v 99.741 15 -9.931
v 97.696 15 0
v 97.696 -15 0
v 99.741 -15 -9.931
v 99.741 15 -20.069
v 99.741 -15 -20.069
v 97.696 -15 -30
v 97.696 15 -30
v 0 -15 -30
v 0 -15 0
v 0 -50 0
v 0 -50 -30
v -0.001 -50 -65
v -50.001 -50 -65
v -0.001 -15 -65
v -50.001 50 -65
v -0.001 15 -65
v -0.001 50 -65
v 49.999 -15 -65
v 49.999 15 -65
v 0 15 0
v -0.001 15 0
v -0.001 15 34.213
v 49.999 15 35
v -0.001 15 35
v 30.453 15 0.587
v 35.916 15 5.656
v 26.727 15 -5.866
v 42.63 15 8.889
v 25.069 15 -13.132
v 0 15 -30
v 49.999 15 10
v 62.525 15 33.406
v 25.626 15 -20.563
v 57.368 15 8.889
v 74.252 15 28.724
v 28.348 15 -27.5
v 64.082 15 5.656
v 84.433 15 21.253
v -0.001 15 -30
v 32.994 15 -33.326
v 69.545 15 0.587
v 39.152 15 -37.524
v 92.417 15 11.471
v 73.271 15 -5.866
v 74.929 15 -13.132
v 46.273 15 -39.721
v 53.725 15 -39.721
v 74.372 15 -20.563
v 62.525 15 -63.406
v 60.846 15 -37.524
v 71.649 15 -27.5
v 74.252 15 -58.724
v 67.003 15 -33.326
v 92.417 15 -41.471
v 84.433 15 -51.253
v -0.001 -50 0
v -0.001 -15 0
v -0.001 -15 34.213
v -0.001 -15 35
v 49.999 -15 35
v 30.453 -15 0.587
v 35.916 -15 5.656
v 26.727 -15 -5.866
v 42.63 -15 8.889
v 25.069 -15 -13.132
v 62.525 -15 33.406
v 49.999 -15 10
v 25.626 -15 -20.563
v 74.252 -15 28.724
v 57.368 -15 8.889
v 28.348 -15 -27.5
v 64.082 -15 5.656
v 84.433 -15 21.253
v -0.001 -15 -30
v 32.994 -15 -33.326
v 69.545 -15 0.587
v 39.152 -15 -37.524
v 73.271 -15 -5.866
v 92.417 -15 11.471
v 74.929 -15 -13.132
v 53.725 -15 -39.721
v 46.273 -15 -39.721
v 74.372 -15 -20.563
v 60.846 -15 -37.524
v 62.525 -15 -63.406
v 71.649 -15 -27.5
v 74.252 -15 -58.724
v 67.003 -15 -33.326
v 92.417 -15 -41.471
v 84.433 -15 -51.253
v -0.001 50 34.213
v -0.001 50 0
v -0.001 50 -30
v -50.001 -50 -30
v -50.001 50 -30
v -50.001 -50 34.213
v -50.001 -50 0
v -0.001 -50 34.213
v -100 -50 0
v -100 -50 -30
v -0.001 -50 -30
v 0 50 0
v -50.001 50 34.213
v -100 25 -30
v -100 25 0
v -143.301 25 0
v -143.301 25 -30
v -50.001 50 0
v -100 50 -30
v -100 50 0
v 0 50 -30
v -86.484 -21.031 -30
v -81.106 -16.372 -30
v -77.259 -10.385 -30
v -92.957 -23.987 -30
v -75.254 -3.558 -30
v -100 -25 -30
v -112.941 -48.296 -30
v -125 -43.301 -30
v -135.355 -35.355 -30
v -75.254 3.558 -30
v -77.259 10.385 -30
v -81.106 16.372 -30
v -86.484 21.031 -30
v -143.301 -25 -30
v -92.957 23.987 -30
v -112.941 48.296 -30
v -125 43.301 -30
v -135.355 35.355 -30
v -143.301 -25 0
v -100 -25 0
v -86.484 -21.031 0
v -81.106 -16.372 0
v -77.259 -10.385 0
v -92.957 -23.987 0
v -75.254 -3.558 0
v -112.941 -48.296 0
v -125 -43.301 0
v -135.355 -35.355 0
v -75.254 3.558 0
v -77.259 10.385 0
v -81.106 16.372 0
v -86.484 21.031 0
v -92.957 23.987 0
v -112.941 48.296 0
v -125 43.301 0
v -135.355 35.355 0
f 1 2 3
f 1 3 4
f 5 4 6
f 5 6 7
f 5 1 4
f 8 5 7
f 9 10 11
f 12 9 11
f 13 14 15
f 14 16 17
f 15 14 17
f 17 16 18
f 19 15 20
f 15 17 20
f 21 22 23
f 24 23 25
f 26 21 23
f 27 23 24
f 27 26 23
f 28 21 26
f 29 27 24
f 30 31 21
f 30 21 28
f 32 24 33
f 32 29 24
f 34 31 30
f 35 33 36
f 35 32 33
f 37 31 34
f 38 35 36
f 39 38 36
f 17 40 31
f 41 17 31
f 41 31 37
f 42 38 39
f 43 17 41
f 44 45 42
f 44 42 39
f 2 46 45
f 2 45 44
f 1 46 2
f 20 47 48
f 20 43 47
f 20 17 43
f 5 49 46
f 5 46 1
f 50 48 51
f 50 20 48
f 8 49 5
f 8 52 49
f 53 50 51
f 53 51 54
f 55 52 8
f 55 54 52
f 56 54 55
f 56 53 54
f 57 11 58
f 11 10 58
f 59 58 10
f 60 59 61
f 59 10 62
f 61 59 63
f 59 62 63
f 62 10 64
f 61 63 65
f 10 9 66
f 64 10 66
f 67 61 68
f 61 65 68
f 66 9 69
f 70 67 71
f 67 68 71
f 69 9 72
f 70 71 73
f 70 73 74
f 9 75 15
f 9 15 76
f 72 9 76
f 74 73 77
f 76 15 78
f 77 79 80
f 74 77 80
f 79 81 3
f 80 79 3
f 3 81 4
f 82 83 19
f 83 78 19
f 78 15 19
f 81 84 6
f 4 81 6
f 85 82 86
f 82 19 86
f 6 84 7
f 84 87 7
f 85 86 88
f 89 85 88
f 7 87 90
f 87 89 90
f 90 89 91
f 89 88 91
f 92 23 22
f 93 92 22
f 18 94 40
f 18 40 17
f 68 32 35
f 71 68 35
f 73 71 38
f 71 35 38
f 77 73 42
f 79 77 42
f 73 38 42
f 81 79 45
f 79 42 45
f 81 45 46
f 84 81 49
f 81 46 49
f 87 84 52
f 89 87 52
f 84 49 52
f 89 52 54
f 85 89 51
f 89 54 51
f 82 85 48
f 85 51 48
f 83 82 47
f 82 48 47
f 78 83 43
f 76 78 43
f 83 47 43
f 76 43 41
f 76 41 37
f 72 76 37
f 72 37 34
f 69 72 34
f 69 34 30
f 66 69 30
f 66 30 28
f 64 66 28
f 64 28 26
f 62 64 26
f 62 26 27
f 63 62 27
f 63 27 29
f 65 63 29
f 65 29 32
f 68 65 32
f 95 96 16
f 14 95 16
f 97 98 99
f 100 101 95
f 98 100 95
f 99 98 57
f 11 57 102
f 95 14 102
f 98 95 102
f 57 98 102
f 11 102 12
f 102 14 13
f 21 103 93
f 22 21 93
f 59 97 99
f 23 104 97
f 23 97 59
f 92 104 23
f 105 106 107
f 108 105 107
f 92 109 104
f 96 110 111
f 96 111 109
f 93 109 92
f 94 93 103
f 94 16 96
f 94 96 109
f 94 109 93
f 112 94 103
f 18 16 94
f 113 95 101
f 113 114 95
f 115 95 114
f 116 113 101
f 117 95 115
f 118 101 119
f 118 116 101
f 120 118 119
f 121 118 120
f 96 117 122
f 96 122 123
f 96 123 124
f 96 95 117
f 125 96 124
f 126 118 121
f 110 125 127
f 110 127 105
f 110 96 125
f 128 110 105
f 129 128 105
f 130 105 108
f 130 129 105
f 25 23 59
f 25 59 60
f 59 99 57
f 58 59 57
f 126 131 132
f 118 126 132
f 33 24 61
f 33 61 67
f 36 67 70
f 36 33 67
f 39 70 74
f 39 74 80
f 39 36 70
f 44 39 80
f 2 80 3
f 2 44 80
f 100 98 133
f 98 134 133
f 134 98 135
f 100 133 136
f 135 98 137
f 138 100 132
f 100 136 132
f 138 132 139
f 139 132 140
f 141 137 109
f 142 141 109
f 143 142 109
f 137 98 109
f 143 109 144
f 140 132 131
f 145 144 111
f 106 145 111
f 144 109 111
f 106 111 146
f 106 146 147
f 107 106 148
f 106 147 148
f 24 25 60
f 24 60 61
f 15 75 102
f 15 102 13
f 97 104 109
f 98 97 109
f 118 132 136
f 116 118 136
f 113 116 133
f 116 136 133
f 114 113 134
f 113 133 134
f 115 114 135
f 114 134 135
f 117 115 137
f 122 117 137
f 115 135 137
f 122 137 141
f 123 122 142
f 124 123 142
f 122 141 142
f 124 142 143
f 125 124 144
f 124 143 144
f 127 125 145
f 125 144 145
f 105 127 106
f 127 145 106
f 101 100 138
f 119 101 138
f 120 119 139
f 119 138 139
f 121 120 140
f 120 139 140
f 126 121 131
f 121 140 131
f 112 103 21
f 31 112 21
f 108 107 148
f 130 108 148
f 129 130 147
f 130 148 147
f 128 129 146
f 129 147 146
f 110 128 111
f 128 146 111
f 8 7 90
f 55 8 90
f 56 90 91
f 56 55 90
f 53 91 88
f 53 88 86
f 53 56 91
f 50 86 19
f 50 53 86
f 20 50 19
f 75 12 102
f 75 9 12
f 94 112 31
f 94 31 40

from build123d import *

# Parameters (mm, degrees)
BOSS_EXTRUDE1_DEPTH = 30
BOSS_EXTRUDE2_DEPTH = 30
CUT_EXTRUDE1_DEPTH  = 64
SKETCH4_R           = 25
CUT_EXTRUDE2_DEPTH  = 93
SKETCH6_W           = 50
SKETCH6_H           = 99.213444665
BOSS_EXTRUDE3_DEPTH = 100


with BuildPart() as part:
    # Sketch1 → Boss-Extrude1 (new body)
    with BuildSketch(Plane.XY):
        with BuildLine():
            Line((-100, 25), (-143.301270189, 25))
            ThreePointArc((-143.301270189, 25), (-125, 43.301270189), (-100, 50))
            Line((-100, 50), (0, 50))
            Line((0, 50), (0, 15))
            Line((0, 15), (100, 15))
            Line((100, 15), (100, -15))
            Line((100, -15), (0, -15))
            Line((0, -15), (0, -50))
            Line((0, -50), (-100, -50))
            ThreePointArc((-100, -50), (-125, -43.301270189), (-143.301270189, -25))
            Line((-143.301270189, -25), (-100, -25))
            ThreePointArc((-100, -25), (-75, 0), (-100, 25))
        make_face()
    extrude(amount=-BOSS_EXTRUDE1_DEPTH)

    # Sketch2 → Boss-Extrude2 (add)
    with BuildSketch(Plane(origin=(0, 15, 0), x_dir=(1, 0, 0), z_dir=(0, 1, 0))):
        with BuildLine():
            Line((49.998729811, 65), (-0.001270189, 65))
            Line((-0.001270189, 65), (-0.001270189, -35))
            Line((-0.001270189, -35), (49.998729811, -35))
            ThreePointArc((49.998729811, -35), (99.998729811, 15), (49.998729811, 65))
        make_face()
    extrude(amount=-BOSS_EXTRUDE2_DEPTH)

    # Sketch3 → Cut-Extrude1 (cut)
    with BuildSketch(Plane(origin=(0, 15, 0), x_dir=(1, 0, 0), z_dir=(0, 1, 0))):
        with BuildLine():
            Line((97.695689882, 30), (100, 30))
            Line((100, 30), (100, 0))
            Line((100, 0), (97.695689882, 0))
            ThreePointArc((97.695689882, 0), (99.998729811, 15), (97.695689882, 30))
        make_face()
    extrude(amount=-CUT_EXTRUDE1_DEPTH, mode=Mode.SUBTRACT)

    # Sketch4 → Cut-Extrude2 (cut)
    with BuildSketch(Plane(origin=(0, 15, 0), x_dir=(1, 0, 0), z_dir=(0, 1, 0))):
        with Locations(Location((49.998729811, 15, 0), (0, 0, 270))):
            Circle(SKETCH4_R)
    extrude(amount=-CUT_EXTRUDE2_DEPTH, mode=Mode.SUBTRACT)

    # Sketch6 → Boss-Extrude3 (add)
    with BuildSketch(Plane(origin=(0, 50, 0), x_dir=(1, 0, 0), z_dir=(0, 1, 0))):
        with Locations((-25.001270189, 15.393277667)):
            Rectangle(SKETCH6_W, SKETCH6_H)
    extrude(amount=-BOSS_EXTRUDE3_DEPTH)


solid = part.part
